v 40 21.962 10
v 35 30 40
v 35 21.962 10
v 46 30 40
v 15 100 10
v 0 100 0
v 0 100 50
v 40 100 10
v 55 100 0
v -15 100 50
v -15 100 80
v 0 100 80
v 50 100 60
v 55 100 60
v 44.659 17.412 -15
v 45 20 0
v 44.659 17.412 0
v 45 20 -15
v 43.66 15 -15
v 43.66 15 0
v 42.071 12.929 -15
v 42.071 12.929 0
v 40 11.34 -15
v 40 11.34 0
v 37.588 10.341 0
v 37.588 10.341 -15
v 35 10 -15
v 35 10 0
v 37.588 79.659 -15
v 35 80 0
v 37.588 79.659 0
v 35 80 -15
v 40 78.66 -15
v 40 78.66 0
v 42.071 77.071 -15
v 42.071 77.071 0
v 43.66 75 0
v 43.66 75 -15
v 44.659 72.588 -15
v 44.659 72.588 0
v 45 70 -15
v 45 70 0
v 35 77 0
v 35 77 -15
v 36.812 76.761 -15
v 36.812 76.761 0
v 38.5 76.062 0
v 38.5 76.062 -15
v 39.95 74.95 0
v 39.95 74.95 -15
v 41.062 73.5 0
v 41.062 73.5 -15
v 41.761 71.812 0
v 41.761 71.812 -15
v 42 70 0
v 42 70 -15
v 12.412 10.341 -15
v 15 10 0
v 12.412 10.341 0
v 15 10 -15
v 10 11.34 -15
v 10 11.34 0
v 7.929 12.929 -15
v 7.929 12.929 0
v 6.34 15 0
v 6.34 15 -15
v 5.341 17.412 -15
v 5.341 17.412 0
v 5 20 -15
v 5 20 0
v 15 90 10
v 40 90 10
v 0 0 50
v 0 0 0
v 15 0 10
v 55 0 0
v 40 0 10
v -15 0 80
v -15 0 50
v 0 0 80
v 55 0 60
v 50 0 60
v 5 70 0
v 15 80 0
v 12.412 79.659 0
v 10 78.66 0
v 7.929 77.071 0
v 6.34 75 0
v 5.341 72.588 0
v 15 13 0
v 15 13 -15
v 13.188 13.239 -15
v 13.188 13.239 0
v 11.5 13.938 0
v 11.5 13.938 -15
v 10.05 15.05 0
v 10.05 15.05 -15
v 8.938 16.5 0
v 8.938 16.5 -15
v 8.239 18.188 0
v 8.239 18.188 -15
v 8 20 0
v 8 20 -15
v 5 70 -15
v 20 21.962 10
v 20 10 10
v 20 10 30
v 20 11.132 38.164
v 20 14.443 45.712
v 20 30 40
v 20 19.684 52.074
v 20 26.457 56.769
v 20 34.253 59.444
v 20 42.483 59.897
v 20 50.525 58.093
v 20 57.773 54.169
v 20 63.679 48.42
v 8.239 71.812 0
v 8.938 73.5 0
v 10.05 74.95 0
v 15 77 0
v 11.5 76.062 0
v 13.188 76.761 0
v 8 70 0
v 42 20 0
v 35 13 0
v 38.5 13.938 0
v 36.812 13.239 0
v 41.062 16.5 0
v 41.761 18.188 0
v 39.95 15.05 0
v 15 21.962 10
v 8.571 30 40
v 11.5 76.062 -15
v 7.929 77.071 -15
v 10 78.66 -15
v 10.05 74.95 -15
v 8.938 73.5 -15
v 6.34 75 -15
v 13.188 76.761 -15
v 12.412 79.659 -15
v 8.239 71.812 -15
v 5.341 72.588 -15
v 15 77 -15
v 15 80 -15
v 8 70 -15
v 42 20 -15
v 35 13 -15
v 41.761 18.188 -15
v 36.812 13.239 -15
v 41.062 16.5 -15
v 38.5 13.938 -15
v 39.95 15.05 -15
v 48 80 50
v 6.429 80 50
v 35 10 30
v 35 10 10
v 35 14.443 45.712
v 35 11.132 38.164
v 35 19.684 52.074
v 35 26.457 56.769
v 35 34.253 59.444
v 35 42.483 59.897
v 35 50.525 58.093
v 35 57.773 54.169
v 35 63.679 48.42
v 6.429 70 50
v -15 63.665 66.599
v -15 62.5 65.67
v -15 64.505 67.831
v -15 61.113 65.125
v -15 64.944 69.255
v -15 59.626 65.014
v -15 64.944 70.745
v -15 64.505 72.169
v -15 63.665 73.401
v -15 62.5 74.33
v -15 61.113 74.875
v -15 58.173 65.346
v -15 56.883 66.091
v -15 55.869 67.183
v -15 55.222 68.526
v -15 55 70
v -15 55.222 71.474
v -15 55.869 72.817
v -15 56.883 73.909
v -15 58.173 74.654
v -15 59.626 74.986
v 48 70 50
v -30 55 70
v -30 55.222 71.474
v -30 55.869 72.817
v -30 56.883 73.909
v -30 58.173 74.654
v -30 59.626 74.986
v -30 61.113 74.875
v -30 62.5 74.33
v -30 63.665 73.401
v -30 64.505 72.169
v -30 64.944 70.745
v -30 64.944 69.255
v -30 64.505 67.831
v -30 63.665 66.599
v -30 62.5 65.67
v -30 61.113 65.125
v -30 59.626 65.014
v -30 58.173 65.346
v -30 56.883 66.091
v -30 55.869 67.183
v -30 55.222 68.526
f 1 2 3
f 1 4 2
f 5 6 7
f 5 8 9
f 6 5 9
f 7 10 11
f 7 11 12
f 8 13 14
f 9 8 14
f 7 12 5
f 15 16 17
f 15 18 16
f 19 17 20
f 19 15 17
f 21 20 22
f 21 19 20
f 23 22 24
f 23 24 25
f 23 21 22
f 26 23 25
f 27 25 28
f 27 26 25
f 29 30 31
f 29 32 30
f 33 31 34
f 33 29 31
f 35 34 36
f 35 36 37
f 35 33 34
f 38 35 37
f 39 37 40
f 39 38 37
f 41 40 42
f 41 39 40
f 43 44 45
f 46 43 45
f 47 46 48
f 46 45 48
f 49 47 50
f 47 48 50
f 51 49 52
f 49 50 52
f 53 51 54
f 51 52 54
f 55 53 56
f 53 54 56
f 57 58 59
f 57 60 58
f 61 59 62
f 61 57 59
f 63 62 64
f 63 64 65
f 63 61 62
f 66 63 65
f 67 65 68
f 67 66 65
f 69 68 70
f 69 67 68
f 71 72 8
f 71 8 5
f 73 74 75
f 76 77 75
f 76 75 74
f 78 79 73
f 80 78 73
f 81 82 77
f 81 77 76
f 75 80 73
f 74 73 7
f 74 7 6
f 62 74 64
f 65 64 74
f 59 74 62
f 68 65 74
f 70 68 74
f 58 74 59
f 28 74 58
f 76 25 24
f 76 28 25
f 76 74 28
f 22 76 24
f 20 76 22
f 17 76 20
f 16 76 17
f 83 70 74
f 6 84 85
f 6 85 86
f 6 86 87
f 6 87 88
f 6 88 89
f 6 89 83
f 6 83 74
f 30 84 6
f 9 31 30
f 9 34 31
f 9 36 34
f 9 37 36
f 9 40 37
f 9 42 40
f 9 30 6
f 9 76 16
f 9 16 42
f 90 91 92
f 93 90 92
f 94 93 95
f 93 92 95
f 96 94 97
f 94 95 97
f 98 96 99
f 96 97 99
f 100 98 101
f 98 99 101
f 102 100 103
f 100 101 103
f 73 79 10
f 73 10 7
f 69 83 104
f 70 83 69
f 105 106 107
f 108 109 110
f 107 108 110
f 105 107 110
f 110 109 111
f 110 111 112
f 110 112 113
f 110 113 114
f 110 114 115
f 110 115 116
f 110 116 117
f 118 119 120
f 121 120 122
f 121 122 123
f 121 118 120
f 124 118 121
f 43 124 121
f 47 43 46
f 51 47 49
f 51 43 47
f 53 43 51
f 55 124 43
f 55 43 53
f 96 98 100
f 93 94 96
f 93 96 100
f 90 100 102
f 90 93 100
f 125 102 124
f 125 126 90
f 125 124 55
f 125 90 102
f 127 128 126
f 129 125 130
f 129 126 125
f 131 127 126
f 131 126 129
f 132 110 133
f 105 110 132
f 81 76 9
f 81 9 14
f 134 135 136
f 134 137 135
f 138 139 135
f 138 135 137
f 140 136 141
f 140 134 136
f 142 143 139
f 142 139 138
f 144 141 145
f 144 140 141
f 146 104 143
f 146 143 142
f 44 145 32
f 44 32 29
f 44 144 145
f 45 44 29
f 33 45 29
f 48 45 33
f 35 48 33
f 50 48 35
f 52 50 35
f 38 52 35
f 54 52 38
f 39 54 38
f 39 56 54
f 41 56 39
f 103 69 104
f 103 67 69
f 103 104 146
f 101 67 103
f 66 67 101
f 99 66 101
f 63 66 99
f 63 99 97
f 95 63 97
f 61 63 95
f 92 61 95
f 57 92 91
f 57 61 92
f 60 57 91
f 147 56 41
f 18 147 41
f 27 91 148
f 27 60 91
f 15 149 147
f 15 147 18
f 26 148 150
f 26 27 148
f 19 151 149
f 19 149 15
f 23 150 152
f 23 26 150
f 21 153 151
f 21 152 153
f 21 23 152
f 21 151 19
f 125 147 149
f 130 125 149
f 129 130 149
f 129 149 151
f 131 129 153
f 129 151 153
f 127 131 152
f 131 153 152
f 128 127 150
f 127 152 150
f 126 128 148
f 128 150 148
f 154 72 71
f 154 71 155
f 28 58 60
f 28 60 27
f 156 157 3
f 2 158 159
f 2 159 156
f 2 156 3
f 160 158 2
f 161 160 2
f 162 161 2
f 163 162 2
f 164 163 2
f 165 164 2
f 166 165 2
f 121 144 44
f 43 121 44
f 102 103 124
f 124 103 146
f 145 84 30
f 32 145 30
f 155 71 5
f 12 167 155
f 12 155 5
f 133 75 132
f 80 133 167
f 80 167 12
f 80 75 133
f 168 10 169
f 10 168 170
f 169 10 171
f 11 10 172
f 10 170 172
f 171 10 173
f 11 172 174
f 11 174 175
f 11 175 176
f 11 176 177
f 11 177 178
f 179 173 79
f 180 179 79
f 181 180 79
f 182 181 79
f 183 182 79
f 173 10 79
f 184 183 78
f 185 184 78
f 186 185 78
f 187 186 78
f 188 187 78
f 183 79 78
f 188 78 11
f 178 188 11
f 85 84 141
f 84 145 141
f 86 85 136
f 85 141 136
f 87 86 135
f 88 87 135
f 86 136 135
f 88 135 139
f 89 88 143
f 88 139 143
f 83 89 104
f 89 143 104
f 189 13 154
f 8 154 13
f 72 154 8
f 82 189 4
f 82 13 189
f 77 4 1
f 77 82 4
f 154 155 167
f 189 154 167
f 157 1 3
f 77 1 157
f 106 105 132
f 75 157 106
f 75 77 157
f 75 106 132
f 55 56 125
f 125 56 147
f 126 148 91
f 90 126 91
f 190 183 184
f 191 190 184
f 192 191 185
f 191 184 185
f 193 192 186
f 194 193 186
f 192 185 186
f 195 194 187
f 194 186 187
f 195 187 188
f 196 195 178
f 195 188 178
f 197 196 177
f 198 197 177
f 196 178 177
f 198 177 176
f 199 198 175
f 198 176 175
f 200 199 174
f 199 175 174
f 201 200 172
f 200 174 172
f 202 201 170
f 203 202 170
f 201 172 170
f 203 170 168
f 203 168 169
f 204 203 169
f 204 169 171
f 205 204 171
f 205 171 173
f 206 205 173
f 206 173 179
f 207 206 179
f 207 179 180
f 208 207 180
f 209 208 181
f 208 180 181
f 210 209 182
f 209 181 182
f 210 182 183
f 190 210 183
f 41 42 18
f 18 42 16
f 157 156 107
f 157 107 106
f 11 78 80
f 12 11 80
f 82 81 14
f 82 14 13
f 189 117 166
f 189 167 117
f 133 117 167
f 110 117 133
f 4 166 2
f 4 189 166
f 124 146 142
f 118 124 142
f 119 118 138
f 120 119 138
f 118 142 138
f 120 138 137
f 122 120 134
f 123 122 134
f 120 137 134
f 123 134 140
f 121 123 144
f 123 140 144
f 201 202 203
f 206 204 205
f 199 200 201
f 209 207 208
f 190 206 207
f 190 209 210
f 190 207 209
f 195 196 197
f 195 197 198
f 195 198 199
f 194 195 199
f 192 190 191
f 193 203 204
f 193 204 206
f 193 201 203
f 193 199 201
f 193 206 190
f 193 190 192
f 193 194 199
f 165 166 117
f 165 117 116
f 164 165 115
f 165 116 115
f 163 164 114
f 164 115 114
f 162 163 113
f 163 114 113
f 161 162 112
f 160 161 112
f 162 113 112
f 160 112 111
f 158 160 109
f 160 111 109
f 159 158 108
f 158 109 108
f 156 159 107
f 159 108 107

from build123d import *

# Parameters (mm, degrees)
F1_DEPTH      = 100
F4_DEPTH      = 20.5
F4_DEPTH_BACK = 21.0714285714
F6_DEPTH      = 7.5
F6_DEPTH_BACK = 7.5
F7_W          = 15
F7_H          = 30
F8_DEPTH      = 100
F9_R          = 5
F10_DEPTH     = 15
F11_W         = 40
F11_H         = 70
F12_DEPTH     = 15
F13_R         = 10
F15_DEPTH     = 15


with BuildPart() as f1:
    # F0 (on Front) → F1 (new body)
    with BuildSketch(Plane.XZ):
        Polygon((15, 10), (0, 80), (0, 0), (55, 0), (55, 60), (50, 60), (40, 10), align=None)
    extrude(amount=-F1_DEPTH)

    # F3 (on offset) → F4 (join, two sides)
    with BuildSketch(Plane.YZ.offset(27.5)) as f4_sk:
        Polygon((30, 40), (21.9615242271, 10), (90, 10), (80, 50), (70, 50), align=None)
    extrude(amount=F4_DEPTH)
    extrude(f4_sk.sketch, amount=-F4_DEPTH_BACK)

    # F5 (on offset) → F6 (join, two sides)
    with BuildSketch(Plane.YZ.offset(27.5)) as f6_sk:
        with BuildLine():
            Line((10, 0), (40, 0))
            ThreePointArc((40, 0), (61.2132034356, 51.2132034356), (10, 30))
            Line((10, 30), (10, 0))
        make_face()
    extrude(amount=F6_DEPTH)
    extrude(f6_sk.sketch, amount=-F6_DEPTH_BACK)

    # F7 (on face) → F8 (join)
    with BuildSketch(Plane.XZ):
        with Locations((-7.5, 65)):
            Rectangle(F7_W, F7_H)
    extrude(amount=-F8_DEPTH)

    # F9 (on face) → F10 (join)
    with BuildSketch(Plane(origin=(-15, 0, 0), x_dir=(0, -1, 0), z_dir=(-1, 0, 0))):
        with Locations((-60, 70)):
            Circle(F9_R)
    extrude(amount=F10_DEPTH)

    # F11 (on face) → F12 (join)
    with BuildSketch(Plane(origin=(0, 0, 0), x_dir=(1, 0, 0), z_dir=(0, 0, -1))):
        with Locations((25, -45)):
            Rectangle(F11_W, F11_H)
    extrude(amount=F12_DEPTH)

    # F13
    f13_edges = [f1.edges().sort_by_distance(p)[0] for p in [
        (45, 10, -7.5),
        (5, 10, -7.5),
        (45, 80, -7.5),
        (5, 80, -7.5),
    ]]
    fillet(f13_edges, radius=F13_R)

    # F14 (on face) → F15 (cut)
    with BuildSketch(Plane(origin=(0, 0, -15), x_dir=(1, 0, 0), z_dir=(0, 0, -1))):
        with BuildLine():
            Line((8, -20), (8, -70))
            ThreePointArc((8, -70), (10.0502525317, -74.9497474683), (15, -77))
            Line((15, -77), (35, -77))
            ThreePointArc((35, -77), (39.9497474683, -74.9497474683), (42, -70))
            Line((42, -70), (42, -20))
            ThreePointArc((42, -20), (39.9497474683, -15.0502525317), (35, -13))
            Line((35, -13), (15, -13))
            ThreePointArc((15, -13), (10.0502525317, -15.0502525317), (8, -20))
        make_face()
    extrude(amount=-F15_DEPTH, mode=Mode.SUBTRACT)


solid = f1.part
